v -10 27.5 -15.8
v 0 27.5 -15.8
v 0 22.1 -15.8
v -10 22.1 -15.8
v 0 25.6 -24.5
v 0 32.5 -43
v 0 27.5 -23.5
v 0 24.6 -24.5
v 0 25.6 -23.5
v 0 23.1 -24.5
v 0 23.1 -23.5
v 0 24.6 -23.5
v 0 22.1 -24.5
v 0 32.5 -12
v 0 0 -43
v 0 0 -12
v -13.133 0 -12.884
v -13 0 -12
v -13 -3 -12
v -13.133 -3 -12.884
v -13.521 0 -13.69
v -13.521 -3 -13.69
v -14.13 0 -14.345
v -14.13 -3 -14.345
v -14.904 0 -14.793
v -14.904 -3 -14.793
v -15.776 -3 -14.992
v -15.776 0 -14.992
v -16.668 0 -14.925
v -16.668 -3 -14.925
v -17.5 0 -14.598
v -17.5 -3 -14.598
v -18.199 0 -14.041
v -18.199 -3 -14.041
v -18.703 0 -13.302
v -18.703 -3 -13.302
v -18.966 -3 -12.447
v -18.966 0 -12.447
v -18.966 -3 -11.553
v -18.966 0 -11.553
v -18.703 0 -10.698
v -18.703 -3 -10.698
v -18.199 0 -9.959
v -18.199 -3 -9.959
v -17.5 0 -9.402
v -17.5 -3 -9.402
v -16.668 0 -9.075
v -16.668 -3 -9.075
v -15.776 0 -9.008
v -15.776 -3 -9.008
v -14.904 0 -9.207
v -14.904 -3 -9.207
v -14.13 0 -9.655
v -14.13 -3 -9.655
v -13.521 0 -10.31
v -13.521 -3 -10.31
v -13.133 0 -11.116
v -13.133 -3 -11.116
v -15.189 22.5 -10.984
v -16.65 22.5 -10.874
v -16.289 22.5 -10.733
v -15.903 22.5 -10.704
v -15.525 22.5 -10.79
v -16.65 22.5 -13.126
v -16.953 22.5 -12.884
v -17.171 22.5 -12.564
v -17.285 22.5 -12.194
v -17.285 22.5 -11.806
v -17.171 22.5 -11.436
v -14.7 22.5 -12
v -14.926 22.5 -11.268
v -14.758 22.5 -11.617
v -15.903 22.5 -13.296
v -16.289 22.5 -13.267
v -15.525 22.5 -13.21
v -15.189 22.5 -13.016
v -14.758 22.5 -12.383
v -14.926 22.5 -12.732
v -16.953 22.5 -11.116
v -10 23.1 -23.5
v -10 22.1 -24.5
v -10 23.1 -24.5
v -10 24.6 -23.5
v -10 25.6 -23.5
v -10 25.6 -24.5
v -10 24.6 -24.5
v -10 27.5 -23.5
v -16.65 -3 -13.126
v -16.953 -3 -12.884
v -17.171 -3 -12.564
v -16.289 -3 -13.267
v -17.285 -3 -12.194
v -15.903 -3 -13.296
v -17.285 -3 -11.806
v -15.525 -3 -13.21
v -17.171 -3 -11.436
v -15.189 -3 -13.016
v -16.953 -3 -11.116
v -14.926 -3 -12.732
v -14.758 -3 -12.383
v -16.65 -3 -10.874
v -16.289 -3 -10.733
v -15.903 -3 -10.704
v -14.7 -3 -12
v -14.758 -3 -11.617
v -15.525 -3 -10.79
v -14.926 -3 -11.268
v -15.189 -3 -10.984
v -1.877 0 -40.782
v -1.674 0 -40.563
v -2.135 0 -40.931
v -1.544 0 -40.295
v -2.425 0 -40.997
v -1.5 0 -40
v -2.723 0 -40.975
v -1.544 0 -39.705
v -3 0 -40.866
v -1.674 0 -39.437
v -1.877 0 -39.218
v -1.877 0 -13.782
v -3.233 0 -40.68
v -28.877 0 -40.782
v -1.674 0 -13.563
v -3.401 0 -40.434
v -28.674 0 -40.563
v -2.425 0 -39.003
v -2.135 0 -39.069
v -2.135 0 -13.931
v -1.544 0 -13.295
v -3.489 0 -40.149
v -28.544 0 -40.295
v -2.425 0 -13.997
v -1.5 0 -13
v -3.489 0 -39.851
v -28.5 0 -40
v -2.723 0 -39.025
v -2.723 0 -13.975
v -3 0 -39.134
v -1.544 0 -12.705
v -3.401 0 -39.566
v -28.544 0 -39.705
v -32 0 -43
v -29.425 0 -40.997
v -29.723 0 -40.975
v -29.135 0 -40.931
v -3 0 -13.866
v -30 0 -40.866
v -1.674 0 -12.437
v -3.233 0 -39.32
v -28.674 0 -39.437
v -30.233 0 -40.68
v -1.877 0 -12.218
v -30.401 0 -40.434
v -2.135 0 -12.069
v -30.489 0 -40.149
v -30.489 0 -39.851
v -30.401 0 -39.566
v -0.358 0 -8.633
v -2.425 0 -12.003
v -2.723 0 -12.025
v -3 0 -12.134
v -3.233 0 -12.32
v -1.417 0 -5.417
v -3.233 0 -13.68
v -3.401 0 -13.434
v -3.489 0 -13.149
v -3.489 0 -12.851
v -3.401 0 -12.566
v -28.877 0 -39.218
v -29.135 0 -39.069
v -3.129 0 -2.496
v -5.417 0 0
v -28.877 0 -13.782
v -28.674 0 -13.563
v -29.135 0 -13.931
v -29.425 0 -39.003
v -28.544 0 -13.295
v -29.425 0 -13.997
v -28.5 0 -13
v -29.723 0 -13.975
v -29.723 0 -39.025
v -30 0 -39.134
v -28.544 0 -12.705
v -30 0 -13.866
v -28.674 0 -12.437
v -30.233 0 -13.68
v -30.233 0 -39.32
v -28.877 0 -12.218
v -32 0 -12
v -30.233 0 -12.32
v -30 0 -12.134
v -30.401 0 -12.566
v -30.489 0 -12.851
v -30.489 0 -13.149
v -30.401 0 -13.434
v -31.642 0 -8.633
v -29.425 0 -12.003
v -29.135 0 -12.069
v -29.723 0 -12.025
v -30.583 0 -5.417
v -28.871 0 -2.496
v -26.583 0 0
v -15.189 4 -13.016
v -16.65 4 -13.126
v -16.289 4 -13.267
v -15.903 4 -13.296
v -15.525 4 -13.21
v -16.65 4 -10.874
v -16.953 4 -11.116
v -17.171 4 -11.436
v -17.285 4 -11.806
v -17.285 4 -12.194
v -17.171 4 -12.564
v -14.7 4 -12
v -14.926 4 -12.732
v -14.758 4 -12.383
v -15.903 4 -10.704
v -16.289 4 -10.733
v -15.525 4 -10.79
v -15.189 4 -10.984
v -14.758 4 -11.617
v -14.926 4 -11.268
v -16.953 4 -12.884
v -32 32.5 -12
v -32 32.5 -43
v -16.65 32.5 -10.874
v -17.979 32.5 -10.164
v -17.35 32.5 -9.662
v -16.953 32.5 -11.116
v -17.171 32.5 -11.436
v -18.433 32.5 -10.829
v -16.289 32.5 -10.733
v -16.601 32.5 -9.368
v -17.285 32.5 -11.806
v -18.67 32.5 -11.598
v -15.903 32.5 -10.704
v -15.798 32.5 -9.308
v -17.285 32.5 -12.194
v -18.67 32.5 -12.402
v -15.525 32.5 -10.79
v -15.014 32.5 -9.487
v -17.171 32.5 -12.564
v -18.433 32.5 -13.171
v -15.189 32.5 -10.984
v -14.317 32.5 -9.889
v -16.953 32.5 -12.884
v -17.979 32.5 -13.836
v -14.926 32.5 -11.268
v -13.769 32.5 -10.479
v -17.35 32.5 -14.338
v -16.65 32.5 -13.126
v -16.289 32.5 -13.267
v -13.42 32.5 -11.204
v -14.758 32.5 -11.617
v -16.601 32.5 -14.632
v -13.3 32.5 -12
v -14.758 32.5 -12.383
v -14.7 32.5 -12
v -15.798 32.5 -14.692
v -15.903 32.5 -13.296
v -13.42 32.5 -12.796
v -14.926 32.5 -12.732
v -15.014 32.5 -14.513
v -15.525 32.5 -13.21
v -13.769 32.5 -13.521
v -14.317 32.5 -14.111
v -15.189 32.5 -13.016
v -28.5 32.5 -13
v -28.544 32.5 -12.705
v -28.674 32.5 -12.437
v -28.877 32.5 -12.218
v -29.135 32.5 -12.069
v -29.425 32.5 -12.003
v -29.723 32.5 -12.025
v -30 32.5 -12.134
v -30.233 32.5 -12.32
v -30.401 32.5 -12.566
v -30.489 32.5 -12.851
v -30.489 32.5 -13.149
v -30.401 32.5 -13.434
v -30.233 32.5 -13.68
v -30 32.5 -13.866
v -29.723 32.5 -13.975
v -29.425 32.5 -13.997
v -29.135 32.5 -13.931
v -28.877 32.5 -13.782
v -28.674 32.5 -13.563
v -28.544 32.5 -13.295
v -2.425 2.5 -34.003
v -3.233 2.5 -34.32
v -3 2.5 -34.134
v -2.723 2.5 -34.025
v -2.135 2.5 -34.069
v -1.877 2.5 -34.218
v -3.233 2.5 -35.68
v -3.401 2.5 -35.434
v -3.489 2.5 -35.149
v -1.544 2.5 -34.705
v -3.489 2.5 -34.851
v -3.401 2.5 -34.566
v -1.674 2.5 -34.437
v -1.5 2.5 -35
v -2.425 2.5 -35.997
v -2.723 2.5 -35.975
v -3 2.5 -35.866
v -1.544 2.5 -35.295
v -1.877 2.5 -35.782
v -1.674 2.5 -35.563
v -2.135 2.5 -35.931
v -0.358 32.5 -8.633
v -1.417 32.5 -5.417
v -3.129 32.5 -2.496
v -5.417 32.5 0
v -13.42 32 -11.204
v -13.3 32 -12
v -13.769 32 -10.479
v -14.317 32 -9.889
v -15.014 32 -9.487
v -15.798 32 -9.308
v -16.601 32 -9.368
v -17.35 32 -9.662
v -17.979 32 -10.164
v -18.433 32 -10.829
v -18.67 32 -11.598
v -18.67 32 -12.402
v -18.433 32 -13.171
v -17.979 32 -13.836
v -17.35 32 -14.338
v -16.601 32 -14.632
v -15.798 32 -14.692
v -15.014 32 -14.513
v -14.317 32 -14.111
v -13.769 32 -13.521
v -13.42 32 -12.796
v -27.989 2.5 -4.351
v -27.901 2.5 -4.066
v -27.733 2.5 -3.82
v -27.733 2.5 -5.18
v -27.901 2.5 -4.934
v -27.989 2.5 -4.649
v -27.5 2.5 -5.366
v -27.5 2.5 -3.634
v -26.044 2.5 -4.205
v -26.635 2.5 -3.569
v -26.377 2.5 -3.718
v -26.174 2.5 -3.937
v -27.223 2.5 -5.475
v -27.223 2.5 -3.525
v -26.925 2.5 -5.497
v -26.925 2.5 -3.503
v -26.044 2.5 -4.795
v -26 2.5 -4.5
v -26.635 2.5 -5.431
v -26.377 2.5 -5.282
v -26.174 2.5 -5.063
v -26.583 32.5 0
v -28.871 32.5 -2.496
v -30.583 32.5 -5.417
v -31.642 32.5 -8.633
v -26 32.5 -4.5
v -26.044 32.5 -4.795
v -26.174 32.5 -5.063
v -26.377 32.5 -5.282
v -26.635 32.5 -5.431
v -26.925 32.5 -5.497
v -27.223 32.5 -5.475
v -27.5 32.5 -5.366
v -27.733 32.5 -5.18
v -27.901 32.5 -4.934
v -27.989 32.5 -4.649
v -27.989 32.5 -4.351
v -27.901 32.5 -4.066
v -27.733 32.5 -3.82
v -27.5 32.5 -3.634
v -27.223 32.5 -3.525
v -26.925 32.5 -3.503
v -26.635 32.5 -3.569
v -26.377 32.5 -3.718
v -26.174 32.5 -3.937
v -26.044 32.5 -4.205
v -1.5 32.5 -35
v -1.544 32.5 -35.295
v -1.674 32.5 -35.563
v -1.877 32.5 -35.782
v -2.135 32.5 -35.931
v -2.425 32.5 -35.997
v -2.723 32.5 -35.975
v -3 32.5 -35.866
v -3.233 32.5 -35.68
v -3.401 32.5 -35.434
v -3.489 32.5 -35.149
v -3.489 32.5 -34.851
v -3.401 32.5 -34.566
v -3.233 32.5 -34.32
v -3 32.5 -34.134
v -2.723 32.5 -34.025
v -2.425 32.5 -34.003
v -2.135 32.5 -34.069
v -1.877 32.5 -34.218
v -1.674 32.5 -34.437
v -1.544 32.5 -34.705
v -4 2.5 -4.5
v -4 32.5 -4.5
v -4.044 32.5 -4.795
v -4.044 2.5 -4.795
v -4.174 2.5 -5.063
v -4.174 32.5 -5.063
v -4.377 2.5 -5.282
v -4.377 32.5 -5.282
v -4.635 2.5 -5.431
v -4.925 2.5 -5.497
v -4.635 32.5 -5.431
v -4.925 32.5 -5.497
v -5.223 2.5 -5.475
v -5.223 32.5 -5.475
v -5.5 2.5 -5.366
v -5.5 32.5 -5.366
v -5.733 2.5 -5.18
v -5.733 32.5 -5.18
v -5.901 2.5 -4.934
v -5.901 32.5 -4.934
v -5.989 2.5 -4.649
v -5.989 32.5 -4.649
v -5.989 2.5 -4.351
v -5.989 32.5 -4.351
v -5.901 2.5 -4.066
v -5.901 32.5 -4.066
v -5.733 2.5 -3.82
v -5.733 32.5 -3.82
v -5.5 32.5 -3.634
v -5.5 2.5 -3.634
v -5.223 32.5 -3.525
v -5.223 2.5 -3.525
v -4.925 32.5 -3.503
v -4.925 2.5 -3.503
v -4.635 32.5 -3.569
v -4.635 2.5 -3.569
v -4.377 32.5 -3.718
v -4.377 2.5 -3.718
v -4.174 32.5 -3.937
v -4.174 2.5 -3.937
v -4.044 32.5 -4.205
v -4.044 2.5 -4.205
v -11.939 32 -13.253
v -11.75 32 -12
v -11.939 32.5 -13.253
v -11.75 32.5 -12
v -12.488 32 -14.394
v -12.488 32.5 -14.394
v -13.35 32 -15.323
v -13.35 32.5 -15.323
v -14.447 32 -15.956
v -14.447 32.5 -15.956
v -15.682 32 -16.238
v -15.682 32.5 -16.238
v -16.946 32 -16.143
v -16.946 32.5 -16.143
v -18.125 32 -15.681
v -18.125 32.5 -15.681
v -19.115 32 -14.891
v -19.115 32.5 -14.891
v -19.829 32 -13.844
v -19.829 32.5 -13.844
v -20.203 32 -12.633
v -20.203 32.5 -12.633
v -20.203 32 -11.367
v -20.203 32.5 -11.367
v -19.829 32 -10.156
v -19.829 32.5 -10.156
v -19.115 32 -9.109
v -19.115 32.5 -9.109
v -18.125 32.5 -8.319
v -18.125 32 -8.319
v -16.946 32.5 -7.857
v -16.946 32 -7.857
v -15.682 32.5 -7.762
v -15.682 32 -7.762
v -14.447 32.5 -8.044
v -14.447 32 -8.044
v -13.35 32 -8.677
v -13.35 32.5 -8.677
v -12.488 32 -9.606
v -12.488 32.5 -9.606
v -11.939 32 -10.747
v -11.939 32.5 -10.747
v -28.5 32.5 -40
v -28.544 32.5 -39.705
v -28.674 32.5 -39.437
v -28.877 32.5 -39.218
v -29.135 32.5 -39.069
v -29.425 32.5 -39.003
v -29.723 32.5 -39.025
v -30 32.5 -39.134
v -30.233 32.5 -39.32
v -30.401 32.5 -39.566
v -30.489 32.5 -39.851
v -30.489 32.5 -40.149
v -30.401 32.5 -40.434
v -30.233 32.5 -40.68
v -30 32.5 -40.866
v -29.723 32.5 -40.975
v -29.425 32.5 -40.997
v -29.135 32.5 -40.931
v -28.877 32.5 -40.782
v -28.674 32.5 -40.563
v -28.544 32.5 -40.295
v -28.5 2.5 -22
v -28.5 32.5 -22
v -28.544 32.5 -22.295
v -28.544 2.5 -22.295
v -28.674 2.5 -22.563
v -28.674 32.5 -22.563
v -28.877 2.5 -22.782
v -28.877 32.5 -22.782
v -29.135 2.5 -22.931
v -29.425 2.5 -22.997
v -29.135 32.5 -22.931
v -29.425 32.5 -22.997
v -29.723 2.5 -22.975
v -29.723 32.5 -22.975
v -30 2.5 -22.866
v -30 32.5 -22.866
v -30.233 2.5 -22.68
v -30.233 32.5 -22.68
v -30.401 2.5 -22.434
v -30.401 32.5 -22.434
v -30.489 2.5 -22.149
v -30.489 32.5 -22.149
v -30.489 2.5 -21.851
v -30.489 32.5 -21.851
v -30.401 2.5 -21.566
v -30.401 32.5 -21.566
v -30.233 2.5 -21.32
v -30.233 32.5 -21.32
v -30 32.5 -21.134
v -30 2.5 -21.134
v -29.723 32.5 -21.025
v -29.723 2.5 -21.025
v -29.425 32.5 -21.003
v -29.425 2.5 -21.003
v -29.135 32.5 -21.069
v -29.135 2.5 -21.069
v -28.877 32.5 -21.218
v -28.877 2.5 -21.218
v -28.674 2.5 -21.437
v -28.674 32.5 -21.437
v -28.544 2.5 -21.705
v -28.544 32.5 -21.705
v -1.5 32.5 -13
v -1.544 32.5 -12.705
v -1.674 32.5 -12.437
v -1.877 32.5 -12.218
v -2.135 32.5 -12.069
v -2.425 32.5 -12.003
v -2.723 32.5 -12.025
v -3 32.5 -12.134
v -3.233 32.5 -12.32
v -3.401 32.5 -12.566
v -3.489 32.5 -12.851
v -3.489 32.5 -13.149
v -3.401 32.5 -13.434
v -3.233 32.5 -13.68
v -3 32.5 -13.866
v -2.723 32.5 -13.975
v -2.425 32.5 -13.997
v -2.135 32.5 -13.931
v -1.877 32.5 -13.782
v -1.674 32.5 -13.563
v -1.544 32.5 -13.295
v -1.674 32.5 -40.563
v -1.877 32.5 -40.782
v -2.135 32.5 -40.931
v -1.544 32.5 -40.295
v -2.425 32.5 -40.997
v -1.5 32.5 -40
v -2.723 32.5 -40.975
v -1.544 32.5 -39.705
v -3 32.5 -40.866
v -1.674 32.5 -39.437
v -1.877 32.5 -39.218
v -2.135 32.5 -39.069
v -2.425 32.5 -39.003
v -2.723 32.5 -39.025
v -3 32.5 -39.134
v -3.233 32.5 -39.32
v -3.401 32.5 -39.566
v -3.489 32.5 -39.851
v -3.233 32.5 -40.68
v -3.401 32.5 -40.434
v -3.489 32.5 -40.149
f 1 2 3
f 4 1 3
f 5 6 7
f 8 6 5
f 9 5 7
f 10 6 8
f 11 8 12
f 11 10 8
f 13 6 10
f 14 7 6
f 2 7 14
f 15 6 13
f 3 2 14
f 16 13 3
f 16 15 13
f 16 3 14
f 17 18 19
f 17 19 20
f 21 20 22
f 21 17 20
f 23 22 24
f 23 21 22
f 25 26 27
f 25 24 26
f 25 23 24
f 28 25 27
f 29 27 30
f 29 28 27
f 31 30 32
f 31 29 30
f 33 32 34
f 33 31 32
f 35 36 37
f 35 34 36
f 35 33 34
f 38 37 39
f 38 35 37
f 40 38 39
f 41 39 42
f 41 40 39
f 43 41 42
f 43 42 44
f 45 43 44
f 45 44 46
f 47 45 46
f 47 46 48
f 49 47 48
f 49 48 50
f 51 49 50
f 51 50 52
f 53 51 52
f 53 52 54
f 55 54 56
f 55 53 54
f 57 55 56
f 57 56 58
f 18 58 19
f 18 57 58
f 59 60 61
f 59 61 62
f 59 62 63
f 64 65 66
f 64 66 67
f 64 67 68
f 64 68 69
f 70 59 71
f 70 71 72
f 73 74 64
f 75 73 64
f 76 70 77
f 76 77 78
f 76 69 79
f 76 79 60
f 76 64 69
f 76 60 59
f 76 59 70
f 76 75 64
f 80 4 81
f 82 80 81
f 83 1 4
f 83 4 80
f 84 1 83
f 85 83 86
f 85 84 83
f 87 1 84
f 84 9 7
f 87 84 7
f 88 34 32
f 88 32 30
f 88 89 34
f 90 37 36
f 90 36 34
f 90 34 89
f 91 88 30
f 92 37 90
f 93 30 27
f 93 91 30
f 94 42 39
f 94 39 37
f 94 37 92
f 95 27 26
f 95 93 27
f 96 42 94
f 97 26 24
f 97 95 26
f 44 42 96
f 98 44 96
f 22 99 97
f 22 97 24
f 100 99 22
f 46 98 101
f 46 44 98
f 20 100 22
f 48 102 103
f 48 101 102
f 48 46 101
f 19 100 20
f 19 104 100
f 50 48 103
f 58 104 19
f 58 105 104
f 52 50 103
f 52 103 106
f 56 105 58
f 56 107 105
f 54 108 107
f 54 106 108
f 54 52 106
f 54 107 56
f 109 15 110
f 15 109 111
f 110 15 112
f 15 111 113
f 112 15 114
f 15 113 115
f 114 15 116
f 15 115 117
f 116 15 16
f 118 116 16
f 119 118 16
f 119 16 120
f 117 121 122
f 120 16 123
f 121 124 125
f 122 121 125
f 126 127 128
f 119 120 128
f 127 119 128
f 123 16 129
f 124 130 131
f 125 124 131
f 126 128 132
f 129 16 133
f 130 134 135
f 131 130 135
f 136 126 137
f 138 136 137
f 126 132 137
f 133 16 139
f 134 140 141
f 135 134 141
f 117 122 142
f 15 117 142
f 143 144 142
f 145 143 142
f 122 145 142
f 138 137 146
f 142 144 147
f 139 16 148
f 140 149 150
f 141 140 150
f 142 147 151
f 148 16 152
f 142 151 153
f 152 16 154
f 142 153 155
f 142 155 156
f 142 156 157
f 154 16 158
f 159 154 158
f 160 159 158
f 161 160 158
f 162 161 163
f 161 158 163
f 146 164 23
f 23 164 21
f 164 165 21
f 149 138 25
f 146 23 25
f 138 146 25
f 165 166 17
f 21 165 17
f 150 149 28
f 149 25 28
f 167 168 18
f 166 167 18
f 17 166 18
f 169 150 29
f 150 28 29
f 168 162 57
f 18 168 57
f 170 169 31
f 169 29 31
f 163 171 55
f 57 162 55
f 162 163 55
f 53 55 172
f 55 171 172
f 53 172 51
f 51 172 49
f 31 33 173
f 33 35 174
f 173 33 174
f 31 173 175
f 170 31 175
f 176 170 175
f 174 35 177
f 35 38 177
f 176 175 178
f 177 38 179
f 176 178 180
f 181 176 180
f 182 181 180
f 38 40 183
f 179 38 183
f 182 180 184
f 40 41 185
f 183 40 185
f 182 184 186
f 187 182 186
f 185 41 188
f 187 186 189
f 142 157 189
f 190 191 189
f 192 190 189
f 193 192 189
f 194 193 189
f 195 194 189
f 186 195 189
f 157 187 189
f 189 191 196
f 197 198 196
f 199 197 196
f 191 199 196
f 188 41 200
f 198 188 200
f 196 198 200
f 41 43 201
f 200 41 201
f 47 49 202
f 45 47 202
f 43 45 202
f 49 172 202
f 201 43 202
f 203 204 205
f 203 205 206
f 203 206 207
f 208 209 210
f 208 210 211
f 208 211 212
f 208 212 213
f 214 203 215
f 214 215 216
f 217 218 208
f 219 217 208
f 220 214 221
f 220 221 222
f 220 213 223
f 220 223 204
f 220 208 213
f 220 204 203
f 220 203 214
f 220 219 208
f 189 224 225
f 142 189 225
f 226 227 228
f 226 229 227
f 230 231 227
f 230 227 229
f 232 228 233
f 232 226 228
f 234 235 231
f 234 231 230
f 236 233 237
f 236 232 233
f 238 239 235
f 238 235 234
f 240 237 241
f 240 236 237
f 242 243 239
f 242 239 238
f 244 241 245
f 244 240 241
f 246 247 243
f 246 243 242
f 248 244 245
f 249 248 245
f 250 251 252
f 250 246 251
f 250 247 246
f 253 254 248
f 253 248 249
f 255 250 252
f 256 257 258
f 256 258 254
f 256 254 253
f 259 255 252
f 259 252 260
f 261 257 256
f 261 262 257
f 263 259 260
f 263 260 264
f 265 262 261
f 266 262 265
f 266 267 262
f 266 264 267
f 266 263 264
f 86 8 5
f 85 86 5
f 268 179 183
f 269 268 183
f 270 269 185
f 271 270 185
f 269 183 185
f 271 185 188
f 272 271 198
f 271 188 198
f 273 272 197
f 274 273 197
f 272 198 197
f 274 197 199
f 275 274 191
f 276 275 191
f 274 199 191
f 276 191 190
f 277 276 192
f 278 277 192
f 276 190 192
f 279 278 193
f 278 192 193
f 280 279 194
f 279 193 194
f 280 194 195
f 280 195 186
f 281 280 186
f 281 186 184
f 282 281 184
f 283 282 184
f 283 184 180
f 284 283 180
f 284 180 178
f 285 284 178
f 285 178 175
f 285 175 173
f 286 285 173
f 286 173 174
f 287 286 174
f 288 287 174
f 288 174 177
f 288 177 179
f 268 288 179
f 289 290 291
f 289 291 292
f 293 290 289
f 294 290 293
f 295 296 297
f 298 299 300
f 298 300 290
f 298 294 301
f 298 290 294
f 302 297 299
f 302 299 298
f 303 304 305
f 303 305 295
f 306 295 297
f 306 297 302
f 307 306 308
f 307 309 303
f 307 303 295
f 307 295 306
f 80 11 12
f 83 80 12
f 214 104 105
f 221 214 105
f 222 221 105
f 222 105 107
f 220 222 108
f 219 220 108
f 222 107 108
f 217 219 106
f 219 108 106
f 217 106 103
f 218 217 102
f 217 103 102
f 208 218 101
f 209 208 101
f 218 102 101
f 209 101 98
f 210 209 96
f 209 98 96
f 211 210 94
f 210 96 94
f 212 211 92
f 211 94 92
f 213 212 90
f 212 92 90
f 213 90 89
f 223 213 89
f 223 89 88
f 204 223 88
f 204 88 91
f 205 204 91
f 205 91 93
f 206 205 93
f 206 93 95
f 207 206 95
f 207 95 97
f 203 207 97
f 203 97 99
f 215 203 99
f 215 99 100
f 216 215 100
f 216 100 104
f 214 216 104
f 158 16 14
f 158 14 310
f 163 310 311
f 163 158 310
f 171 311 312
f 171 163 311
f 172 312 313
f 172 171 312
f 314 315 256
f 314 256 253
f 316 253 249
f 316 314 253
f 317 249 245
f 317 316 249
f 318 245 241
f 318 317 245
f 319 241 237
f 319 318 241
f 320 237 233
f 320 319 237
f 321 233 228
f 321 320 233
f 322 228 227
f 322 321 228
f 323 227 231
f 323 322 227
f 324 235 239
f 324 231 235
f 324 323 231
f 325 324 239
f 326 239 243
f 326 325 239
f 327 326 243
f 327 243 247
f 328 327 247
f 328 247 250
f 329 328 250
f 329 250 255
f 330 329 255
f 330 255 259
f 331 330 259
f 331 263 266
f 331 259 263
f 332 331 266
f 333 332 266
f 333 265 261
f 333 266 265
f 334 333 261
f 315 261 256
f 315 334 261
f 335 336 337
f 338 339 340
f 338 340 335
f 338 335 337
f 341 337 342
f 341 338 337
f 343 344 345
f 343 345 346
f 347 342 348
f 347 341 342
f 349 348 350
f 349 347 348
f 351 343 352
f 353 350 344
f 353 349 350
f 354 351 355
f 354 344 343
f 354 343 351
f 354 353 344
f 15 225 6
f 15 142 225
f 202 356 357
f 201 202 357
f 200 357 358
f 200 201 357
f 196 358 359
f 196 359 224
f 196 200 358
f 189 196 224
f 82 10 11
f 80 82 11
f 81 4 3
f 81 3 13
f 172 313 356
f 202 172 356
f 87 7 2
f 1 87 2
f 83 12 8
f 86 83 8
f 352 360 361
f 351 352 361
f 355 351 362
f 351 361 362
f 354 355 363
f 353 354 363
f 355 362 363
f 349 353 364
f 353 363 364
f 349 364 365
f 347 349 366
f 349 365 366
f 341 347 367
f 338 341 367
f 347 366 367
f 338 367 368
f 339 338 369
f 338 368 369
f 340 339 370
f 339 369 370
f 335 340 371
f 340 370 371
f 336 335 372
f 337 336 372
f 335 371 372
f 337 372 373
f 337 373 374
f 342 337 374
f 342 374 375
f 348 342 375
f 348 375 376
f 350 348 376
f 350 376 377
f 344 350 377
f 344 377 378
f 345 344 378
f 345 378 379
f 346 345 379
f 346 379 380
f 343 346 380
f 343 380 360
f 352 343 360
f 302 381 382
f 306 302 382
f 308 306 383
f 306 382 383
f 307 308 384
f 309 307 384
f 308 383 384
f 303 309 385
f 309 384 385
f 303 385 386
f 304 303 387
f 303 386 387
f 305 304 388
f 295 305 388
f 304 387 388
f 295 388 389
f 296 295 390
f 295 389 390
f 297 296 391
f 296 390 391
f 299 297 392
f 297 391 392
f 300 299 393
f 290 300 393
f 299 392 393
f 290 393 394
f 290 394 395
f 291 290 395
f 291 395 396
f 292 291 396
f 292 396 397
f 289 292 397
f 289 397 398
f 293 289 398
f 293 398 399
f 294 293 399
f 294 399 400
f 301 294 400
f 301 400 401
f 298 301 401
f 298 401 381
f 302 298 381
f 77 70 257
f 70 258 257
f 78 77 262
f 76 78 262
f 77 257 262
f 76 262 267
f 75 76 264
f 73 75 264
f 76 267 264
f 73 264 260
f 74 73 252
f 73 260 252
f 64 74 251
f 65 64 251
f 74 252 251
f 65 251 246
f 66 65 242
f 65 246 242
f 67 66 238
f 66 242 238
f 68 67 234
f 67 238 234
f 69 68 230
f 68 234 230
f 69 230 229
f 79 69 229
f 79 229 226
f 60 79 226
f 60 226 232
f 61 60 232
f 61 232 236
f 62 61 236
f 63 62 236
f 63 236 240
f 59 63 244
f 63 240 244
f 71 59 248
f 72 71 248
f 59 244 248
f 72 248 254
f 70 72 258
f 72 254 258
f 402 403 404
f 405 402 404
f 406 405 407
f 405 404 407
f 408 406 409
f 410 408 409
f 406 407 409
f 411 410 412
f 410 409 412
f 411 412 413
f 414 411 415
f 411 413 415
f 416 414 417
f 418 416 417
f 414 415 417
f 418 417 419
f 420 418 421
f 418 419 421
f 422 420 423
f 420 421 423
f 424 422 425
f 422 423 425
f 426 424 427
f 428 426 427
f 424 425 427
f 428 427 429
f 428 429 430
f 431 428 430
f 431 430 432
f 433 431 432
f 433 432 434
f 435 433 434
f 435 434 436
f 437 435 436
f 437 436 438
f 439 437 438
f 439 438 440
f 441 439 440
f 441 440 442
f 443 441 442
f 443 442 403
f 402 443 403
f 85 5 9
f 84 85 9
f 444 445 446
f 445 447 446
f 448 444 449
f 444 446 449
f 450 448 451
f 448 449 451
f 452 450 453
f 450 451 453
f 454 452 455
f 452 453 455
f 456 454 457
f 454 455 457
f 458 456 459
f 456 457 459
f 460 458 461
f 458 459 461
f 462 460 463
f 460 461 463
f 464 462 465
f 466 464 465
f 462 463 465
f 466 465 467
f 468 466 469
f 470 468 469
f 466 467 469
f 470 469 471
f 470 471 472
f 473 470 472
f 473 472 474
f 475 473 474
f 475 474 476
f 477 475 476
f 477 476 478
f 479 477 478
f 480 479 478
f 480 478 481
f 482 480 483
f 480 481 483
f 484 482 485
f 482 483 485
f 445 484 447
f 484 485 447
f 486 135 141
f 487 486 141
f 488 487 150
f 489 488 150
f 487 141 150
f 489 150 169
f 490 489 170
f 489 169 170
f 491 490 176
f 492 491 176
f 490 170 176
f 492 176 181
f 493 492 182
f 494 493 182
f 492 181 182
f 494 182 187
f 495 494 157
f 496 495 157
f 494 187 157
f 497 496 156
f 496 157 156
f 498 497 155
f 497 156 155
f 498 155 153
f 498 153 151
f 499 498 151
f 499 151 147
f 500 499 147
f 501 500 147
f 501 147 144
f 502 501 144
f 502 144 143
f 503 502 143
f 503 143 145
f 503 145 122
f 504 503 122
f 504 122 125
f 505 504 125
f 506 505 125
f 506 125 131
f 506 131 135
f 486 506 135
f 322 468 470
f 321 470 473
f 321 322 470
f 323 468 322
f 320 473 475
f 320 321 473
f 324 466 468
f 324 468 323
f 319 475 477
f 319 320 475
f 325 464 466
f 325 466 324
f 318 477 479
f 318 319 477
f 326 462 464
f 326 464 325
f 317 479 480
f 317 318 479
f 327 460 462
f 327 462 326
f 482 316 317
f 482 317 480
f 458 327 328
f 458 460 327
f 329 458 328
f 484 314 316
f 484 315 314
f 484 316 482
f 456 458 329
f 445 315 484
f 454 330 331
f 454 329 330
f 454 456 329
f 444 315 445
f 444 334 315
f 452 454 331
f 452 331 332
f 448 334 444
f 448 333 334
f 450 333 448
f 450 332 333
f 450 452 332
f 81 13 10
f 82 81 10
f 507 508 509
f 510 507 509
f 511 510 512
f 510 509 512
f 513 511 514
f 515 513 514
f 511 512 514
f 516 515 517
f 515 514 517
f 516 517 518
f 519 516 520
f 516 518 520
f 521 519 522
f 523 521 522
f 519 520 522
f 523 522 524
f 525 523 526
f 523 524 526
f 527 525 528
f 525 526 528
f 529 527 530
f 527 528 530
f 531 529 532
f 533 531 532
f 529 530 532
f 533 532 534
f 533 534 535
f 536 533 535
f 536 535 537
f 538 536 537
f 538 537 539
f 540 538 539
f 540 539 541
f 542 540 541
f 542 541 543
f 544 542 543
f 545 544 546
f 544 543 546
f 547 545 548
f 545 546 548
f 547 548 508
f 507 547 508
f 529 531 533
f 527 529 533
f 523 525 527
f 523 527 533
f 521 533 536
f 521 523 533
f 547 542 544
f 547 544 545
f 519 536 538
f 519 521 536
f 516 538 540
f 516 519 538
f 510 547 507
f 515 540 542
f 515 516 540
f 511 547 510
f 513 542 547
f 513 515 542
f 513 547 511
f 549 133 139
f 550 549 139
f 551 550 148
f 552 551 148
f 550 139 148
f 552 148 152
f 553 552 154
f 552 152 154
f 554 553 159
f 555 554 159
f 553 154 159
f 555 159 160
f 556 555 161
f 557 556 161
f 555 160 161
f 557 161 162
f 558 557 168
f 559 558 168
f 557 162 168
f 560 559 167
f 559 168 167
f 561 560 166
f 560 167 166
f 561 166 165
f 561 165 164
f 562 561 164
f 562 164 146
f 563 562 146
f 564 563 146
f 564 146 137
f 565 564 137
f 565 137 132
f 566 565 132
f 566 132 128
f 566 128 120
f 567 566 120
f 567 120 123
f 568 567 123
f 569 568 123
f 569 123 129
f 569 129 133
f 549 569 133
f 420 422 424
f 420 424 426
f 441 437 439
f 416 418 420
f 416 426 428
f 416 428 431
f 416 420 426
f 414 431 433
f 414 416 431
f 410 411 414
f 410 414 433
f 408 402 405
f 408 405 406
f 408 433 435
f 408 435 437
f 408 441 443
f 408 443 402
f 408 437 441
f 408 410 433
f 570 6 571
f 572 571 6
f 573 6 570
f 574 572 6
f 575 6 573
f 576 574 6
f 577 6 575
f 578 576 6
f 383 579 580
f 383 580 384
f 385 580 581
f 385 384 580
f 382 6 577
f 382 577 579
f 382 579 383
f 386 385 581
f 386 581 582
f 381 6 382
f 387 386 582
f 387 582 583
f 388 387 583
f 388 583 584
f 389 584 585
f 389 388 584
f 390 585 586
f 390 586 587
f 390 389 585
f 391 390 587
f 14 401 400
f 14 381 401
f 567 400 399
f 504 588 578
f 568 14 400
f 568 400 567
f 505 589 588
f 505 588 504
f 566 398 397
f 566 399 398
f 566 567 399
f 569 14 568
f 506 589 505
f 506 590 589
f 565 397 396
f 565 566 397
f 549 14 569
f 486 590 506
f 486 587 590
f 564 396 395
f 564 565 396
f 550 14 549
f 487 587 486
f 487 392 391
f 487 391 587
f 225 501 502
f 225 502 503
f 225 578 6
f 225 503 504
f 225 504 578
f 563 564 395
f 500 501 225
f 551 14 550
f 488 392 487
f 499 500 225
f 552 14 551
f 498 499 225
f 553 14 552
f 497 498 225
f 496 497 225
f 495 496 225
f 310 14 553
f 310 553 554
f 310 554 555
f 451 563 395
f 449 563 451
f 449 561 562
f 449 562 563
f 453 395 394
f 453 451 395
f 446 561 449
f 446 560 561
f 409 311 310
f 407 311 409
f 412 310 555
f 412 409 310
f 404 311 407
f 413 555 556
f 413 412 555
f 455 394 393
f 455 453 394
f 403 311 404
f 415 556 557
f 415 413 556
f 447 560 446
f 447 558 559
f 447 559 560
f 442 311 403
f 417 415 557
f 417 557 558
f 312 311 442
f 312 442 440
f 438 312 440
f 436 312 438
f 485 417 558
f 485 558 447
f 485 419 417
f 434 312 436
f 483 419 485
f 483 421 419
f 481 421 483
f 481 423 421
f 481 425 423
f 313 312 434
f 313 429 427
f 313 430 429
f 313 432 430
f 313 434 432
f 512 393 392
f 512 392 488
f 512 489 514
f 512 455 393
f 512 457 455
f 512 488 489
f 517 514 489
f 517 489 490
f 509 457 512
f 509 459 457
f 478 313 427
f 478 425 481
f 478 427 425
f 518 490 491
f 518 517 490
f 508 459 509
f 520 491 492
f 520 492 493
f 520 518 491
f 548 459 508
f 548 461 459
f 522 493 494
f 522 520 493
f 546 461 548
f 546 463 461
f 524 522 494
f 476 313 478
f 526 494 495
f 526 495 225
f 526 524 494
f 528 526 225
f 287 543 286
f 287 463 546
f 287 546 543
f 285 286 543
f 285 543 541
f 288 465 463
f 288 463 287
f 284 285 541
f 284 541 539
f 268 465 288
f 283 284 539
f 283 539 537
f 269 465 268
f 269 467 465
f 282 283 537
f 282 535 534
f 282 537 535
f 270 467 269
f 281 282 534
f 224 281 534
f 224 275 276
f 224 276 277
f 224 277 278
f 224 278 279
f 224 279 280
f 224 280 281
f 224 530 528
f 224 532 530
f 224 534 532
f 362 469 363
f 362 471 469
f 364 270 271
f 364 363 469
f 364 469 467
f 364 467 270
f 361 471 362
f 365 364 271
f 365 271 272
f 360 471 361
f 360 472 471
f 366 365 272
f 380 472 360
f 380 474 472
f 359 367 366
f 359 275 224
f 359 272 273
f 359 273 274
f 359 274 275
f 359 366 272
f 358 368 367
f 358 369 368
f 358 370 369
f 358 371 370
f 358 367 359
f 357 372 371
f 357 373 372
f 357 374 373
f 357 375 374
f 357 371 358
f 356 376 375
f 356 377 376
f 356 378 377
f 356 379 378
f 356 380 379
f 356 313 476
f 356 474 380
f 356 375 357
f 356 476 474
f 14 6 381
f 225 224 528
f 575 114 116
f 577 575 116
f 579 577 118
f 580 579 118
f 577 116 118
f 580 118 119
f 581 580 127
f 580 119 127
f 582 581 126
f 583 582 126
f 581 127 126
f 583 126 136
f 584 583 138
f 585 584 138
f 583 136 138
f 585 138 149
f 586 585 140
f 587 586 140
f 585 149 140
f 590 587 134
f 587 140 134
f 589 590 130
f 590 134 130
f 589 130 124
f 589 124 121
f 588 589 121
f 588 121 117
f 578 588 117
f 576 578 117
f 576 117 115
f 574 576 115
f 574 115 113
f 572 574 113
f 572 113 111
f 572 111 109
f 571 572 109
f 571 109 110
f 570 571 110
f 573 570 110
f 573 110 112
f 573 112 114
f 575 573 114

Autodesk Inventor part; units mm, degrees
ref_plane "YZ Plane" through (0, 0, 0) normal (1, 0, 0) x (0, 1, 0)
ref_plane "XZ Plane" through (0, 0, 0) normal (0, 1, 0) x (-1, 0, 0)
ref_plane "XY Plane" through (0, 0, 0) normal (0, 0, 1) x (1, 0, 0)
sketch "スケッチ1" plane through (0, 0, 0) normal (0, 1, 0) x (-1, 0, 0)
  line L0 (0, 0) -> (32, 0)
  line L1 (32, 0) -> (32, -43)
  line L2 (32, -43) -> (0, -43)
  line L3 (0, -43) -> (0, 0)
  dimension "d0" = 32
  dimension "d1" = 43
extrude "押し出し1" add sketch "スケッチ1" along normal blind 32.5
sketch "スケッチ2" plane through (0, 0, 0) normal (0, -1, 0) x (1, 0, 0)
  line L0 (-32, -43) -> (-32, 0) construction
  line L1 (-32, -21.5) -> (0, -21.5) construction
  line L2 (0, 0) -> (0, -43) construction
  line L3 (-16, -21.5) -> (-16, -12) construction
  line L4 (-32, 0) -> (-32, -43) projected
  arc A0 (-26.583, 0) -> (-32, -12) centre (-16, -12) ccw
  arc A1 (0, -12) -> (-5.417, 0) centre (-16, -12) ccw
  line L5 (-32, -12) -> (-32, 0)
  line L6 (0, 0) -> (-32, 0) projected
  line L7 (-5.417, 0) -> (0, 0)
  line L8 (0, 0) -> (0, -12)
  line L9 (-32, 0) -> (-26.583, 0)
  dimension "d4" = 9.5
extrude "押し出し2" cut sketch "スケッチ2" against normal blind 32.5
sketch "スケッチ3" plane through (0, 0, 0) normal (0, -1, 0) x (1, 0, 0)
  line L0 (-32, -21.5) -> (0, -21.5) construction
  line L1 (0, -21.5) -> (0, -43) construction
  line L2 (-5.417, 0) -> (-26.583, 0) construction
  line L3 (-16, 0) -> (-16, -43) construction
  line L4 (-32, -43) -> (0, -43) construction
  line L5 (-16, -21.5) -> (-16, -13) construction
  line L6 (-16, -21.5) -> (-29.5, -21.5) construction
  circle A0 centre (-29.5, -13) radius 1
  line L7 (-16, -21.5) -> (-2.5, -21.5) construction
  circle A1 centre (-2.5, -13) radius 1
  line L8 (-16, -21.5) -> (-16, -40) construction
  circle A2 centre (-29.5, -40) radius 1
  circle A3 centre (-2.5, -40) radius 1
  point P0 (0, 0)
  dimension "d8" = 8.5
  dimension "d9" = 13.5
  dimension "d10" = 2
  dimension "d11" = 13.5
  dimension "d12" = 2
  dimension "d13" = 18.5
  dimension "d14" = 2
  dimension "d15" = 2
extrude "押し出し3" cut sketch "スケッチ3" against normal blind 32.5
sketch "スケッチ4" plane through (0, 32.5, 0) normal (0, 1, 0) x (1, 0, 0)
  line L0 (-5.417, 0) -> (-26.583, 0) construction
  line L1 (-32, 21.5) -> (0, 21.5) construction
  line L2 (0, 21.5) -> (0, 43) construction
  line L3 (-16, 0) -> (-16, 43) construction
  line L4 (-32, 43) -> (0, 43) construction
  line L5 (-16, 21.5) -> (-16, 13) construction
  line L6 (-16, 21.5) -> (-29.5, 21.5) construction
  circle A0 centre (-29.5, 13) radius 1
  line L7 (-16, 21.5) -> (-2.5, 21.5) construction
  circle A1 centre (-2.5, 13) radius 1
  line L8 (-16, 21.5) -> (-16, 40) construction
  circle A2 centre (-29.5, 40) radius 1
  circle A3 centre (-2.5, 40) radius 1
  line L9 (-29.5, 21.5) -> (-29.5, 22) construction
  line L10 (-2.5, 21.5) -> (-2.5, 35) construction
  line L11 (-16, 21.5) -> (-16, 4.5) construction
  line L12 (-16, 4.5) -> (-5, 4.5) construction
  line L13 (-16, 4.5) -> (-27, 4.5) construction
  circle A4 centre (-2.5, 35) radius 1
  circle A5 centre (-29.5, 22) radius 1
  circle A6 centre (-27, 4.5) radius 1
  circle A7 centre (-5, 4.5) radius 1
  line L14 (0, 43) -> (-32, 43) projected
  line L15 (0, 43) -> (-32, 43)
  line L16 (-32, 43) -> (-32, 12) projected
  line L17 (-32, 43) -> (-32, 12)
  line L18 (0, 12) -> (0, 43) projected
  line L19 (0, 43) -> (0, 12)
  line L20 (-26.583, 0) -> (-5.417, 0) projected
  line L21 (-5.417, 0) -> (-26.583, 0)
  arc A8 (-32, 12) -> (-26.583, 0) centre (-16, 12) ccw
  arc A9 (-5.417, 0) -> (0, 12) centre (-16, 12) ccw projected
  arc A10 (-5.417, 0) -> (0, 12) centre (-16, 12) ccw
  circle A11 centre (-29.5, 40) radius 1 construction
  line L22 (-2.5, 40) -> (-29.5, 40) construction
  point P0 (0, 0)
  point P1 (0, 0)
  dimension "d26" = 0.5
  dimension "d27" = 13.5
  dimension "d28" = 17
  dimension "d29" = 11
  dimension "d30" = 11
  dimension "d31" = 2
  dimension "d32" = 2
  dimension "d33" = 2
  dimension "d34" = 2
extrude "押し出し4" cut sketch "スケッチ4" against normal blind 30 contours A4 | A5 | A6 | A7
sketch "スケッチ5" plane through (0, 0, 0) normal (0, -1, 0) x (1, 0, 0)
  line L0 (-32, -21.5) -> (0, -21.5) construction
  line L1 (0, -21.5) -> (0, -43) construction
  line L2 (-5.417, 0) -> (-26.583, 0) construction
  line L3 (-16, 0) -> (-16, -43) construction
  line L4 (-32, -43) -> (0, -43) construction
  line L5 (-16, -21.5) -> (-16, -12) construction
  line L6 (-16, -21.5) -> (-29.5, -21.5) construction
  circle A0 centre (-29.5, -13) radius 1
  line L7 (-16, -21.5) -> (-2.5, -21.5) construction
  circle A1 centre (-2.5, -13) radius 1
  line L8 (-16, -21.5) -> (-16, -40) construction
  circle A2 centre (-29.5, -40) radius 1
  circle A3 centre (-2.5, -40) radius 1
  circle A4 centre (-16, -12) radius 3
  point P0 (0, 0)
  point P1 (0, 0)
  dimension "d37" = 9.5
  dimension "d38" = 13.5
  dimension "d39" = 2
  dimension "d40" = 13.5
  dimension "d41" = 2
  dimension "d42" = 18.5
  dimension "d43" = 2
  dimension "d44" = 2
  dimension "d45" = 6
extrude "押し出し5" add sketch "スケッチ5" along normal blind 3 contours A4
sketch "スケッチ6" plane through (-16, -3, -12) normal (0, -1, 0) x (1, 0, 0)
  circle A0 centre (0, 0) radius 1.3
  point P0 (16, 12)
  dimension "d48" = 2.6
extrude "押し出し6" cut sketch "スケッチ6" against normal blind 7
sketch "スケッチ7" plane through (0, 32.5, 0) normal (0, 1, 0) x (1, 0, 0)
  line L0 (-5.417, 0) -> (-26.583, 0) construction
  line L1 (-16, 21.5) -> (-29.5, 21.5) construction
  line L2 (-16, 21.5) -> (-16, 13) construction
  line L3 (-16, 21.5) -> (-2.5, 21.5) construction
  line L4 (-32, 21.5) -> (0, 21.5) construction
  line L5 (-32, 43) -> (0, 43) construction
  line L6 (-16, 21.5) -> (-16, 40) construction
  line L7 (0, 21.5) -> (0, 43) construction
  line L8 (-16, 0) -> (-16, 43) construction
  line L9 (-29.5, 21.5) -> (-29.5, 22) construction
  line L10 (-16, 21.5) -> (-16, 12) construction
  line L11 (-16, 12) -> (-5, 12) construction
  line L12 (-16, 12) -> (-27, 12) construction
  circle A0 centre (-16, 12) radius 1.3 projected
  circle A1 centre (-16, 12) radius 4.25
  point P0 (0, 0)
  point P1 (0, 0)
  point P2 (0, 0)
  dimension "d53" = 9.5
  dimension "d60" = 8.5
extrude "押し出し7" cut sketch "スケッチ7" against normal blind 0.5 contours A0 | A1
sketch "スケッチ8" plane through (-16, 32, -12) normal (0, 1, 0) x (1, 0, 0)
  circle A0 centre (0, 0) radius 2.7
  point P0 (16, -12)
  dimension "d63" = 5.4
extrude "押し出し8" add sketch "スケッチ8" along normal blind 0.5
sketch "スケッチ9" plane through (-16, 32.5, -12) normal (0, 1, 0) x (1, 0, 0)
  circle A0 centre (0, 0) radius 1.3
  point P0 (16, -12)
  dimension "d66" = 2.6
extrude "押し出し9" cut sketch "スケッチ9" against normal blind 10
sketch "スケッチ10" plane through (0, 0, -43) normal (1, 0, 0) x (0, 0, -1)
  line L0 (0, 0) -> (0, 32.5) construction
  line L1 (0, 0) -> (-31, 0) construction
  line L2 (-21.5, 27.5) -> (-27.2, 27.5)
  line L3 (-27.2, 27.5) -> (-27.2, 24.6)
  line L4 (-27.2, 24.6) -> (-18.5, 24.6)
  line L5 (-18.5, 24.6) -> (-18.5, 25.6)
  line L6 (-18.5, 25.6) -> (-19.5, 25.6)
  line L7 (-19.5, 25.6) -> (-19.5, 27.5)
  line L8 (-19.5, 27.5) -> (-21.5, 27.5)
  line L9 (-27.2, 24.6) -> (-27.2, 22.1)
  line L10 (-27.2, 22.1) -> (-18.5, 22.1)
  line L11 (-18.5, 22.1) -> (-18.5, 23.1)
  line L12 (-18.5, 23.1) -> (-19.5, 23.1)
  line L13 (-19.5, 23.1) -> (-19.5, 24.6)
  line L14 (0, 32.5) -> (-21.5, 32.5) construction
  line L15 (-31, 32.5) -> (0, 32.5) construction
  line L16 (-21.5, 32.5) -> (-21.5, 27.5) construction
  point P0 (-43, 0)
  dimension "d72" = 2.9
  dimension "d73" = 5.7
  dimension "d74" = 8.7
  dimension "d75" = 1
  dimension "d76" = 1
  dimension "d79" = 2.5
  dimension "d80" = 1
  dimension "d81" = 1
  dimension "d85" = 21.5
  dimension "d86" = 5
extrude "押し出し11" cut sketch "スケッチ10" against normal blind 10
properties part number "Servo"
